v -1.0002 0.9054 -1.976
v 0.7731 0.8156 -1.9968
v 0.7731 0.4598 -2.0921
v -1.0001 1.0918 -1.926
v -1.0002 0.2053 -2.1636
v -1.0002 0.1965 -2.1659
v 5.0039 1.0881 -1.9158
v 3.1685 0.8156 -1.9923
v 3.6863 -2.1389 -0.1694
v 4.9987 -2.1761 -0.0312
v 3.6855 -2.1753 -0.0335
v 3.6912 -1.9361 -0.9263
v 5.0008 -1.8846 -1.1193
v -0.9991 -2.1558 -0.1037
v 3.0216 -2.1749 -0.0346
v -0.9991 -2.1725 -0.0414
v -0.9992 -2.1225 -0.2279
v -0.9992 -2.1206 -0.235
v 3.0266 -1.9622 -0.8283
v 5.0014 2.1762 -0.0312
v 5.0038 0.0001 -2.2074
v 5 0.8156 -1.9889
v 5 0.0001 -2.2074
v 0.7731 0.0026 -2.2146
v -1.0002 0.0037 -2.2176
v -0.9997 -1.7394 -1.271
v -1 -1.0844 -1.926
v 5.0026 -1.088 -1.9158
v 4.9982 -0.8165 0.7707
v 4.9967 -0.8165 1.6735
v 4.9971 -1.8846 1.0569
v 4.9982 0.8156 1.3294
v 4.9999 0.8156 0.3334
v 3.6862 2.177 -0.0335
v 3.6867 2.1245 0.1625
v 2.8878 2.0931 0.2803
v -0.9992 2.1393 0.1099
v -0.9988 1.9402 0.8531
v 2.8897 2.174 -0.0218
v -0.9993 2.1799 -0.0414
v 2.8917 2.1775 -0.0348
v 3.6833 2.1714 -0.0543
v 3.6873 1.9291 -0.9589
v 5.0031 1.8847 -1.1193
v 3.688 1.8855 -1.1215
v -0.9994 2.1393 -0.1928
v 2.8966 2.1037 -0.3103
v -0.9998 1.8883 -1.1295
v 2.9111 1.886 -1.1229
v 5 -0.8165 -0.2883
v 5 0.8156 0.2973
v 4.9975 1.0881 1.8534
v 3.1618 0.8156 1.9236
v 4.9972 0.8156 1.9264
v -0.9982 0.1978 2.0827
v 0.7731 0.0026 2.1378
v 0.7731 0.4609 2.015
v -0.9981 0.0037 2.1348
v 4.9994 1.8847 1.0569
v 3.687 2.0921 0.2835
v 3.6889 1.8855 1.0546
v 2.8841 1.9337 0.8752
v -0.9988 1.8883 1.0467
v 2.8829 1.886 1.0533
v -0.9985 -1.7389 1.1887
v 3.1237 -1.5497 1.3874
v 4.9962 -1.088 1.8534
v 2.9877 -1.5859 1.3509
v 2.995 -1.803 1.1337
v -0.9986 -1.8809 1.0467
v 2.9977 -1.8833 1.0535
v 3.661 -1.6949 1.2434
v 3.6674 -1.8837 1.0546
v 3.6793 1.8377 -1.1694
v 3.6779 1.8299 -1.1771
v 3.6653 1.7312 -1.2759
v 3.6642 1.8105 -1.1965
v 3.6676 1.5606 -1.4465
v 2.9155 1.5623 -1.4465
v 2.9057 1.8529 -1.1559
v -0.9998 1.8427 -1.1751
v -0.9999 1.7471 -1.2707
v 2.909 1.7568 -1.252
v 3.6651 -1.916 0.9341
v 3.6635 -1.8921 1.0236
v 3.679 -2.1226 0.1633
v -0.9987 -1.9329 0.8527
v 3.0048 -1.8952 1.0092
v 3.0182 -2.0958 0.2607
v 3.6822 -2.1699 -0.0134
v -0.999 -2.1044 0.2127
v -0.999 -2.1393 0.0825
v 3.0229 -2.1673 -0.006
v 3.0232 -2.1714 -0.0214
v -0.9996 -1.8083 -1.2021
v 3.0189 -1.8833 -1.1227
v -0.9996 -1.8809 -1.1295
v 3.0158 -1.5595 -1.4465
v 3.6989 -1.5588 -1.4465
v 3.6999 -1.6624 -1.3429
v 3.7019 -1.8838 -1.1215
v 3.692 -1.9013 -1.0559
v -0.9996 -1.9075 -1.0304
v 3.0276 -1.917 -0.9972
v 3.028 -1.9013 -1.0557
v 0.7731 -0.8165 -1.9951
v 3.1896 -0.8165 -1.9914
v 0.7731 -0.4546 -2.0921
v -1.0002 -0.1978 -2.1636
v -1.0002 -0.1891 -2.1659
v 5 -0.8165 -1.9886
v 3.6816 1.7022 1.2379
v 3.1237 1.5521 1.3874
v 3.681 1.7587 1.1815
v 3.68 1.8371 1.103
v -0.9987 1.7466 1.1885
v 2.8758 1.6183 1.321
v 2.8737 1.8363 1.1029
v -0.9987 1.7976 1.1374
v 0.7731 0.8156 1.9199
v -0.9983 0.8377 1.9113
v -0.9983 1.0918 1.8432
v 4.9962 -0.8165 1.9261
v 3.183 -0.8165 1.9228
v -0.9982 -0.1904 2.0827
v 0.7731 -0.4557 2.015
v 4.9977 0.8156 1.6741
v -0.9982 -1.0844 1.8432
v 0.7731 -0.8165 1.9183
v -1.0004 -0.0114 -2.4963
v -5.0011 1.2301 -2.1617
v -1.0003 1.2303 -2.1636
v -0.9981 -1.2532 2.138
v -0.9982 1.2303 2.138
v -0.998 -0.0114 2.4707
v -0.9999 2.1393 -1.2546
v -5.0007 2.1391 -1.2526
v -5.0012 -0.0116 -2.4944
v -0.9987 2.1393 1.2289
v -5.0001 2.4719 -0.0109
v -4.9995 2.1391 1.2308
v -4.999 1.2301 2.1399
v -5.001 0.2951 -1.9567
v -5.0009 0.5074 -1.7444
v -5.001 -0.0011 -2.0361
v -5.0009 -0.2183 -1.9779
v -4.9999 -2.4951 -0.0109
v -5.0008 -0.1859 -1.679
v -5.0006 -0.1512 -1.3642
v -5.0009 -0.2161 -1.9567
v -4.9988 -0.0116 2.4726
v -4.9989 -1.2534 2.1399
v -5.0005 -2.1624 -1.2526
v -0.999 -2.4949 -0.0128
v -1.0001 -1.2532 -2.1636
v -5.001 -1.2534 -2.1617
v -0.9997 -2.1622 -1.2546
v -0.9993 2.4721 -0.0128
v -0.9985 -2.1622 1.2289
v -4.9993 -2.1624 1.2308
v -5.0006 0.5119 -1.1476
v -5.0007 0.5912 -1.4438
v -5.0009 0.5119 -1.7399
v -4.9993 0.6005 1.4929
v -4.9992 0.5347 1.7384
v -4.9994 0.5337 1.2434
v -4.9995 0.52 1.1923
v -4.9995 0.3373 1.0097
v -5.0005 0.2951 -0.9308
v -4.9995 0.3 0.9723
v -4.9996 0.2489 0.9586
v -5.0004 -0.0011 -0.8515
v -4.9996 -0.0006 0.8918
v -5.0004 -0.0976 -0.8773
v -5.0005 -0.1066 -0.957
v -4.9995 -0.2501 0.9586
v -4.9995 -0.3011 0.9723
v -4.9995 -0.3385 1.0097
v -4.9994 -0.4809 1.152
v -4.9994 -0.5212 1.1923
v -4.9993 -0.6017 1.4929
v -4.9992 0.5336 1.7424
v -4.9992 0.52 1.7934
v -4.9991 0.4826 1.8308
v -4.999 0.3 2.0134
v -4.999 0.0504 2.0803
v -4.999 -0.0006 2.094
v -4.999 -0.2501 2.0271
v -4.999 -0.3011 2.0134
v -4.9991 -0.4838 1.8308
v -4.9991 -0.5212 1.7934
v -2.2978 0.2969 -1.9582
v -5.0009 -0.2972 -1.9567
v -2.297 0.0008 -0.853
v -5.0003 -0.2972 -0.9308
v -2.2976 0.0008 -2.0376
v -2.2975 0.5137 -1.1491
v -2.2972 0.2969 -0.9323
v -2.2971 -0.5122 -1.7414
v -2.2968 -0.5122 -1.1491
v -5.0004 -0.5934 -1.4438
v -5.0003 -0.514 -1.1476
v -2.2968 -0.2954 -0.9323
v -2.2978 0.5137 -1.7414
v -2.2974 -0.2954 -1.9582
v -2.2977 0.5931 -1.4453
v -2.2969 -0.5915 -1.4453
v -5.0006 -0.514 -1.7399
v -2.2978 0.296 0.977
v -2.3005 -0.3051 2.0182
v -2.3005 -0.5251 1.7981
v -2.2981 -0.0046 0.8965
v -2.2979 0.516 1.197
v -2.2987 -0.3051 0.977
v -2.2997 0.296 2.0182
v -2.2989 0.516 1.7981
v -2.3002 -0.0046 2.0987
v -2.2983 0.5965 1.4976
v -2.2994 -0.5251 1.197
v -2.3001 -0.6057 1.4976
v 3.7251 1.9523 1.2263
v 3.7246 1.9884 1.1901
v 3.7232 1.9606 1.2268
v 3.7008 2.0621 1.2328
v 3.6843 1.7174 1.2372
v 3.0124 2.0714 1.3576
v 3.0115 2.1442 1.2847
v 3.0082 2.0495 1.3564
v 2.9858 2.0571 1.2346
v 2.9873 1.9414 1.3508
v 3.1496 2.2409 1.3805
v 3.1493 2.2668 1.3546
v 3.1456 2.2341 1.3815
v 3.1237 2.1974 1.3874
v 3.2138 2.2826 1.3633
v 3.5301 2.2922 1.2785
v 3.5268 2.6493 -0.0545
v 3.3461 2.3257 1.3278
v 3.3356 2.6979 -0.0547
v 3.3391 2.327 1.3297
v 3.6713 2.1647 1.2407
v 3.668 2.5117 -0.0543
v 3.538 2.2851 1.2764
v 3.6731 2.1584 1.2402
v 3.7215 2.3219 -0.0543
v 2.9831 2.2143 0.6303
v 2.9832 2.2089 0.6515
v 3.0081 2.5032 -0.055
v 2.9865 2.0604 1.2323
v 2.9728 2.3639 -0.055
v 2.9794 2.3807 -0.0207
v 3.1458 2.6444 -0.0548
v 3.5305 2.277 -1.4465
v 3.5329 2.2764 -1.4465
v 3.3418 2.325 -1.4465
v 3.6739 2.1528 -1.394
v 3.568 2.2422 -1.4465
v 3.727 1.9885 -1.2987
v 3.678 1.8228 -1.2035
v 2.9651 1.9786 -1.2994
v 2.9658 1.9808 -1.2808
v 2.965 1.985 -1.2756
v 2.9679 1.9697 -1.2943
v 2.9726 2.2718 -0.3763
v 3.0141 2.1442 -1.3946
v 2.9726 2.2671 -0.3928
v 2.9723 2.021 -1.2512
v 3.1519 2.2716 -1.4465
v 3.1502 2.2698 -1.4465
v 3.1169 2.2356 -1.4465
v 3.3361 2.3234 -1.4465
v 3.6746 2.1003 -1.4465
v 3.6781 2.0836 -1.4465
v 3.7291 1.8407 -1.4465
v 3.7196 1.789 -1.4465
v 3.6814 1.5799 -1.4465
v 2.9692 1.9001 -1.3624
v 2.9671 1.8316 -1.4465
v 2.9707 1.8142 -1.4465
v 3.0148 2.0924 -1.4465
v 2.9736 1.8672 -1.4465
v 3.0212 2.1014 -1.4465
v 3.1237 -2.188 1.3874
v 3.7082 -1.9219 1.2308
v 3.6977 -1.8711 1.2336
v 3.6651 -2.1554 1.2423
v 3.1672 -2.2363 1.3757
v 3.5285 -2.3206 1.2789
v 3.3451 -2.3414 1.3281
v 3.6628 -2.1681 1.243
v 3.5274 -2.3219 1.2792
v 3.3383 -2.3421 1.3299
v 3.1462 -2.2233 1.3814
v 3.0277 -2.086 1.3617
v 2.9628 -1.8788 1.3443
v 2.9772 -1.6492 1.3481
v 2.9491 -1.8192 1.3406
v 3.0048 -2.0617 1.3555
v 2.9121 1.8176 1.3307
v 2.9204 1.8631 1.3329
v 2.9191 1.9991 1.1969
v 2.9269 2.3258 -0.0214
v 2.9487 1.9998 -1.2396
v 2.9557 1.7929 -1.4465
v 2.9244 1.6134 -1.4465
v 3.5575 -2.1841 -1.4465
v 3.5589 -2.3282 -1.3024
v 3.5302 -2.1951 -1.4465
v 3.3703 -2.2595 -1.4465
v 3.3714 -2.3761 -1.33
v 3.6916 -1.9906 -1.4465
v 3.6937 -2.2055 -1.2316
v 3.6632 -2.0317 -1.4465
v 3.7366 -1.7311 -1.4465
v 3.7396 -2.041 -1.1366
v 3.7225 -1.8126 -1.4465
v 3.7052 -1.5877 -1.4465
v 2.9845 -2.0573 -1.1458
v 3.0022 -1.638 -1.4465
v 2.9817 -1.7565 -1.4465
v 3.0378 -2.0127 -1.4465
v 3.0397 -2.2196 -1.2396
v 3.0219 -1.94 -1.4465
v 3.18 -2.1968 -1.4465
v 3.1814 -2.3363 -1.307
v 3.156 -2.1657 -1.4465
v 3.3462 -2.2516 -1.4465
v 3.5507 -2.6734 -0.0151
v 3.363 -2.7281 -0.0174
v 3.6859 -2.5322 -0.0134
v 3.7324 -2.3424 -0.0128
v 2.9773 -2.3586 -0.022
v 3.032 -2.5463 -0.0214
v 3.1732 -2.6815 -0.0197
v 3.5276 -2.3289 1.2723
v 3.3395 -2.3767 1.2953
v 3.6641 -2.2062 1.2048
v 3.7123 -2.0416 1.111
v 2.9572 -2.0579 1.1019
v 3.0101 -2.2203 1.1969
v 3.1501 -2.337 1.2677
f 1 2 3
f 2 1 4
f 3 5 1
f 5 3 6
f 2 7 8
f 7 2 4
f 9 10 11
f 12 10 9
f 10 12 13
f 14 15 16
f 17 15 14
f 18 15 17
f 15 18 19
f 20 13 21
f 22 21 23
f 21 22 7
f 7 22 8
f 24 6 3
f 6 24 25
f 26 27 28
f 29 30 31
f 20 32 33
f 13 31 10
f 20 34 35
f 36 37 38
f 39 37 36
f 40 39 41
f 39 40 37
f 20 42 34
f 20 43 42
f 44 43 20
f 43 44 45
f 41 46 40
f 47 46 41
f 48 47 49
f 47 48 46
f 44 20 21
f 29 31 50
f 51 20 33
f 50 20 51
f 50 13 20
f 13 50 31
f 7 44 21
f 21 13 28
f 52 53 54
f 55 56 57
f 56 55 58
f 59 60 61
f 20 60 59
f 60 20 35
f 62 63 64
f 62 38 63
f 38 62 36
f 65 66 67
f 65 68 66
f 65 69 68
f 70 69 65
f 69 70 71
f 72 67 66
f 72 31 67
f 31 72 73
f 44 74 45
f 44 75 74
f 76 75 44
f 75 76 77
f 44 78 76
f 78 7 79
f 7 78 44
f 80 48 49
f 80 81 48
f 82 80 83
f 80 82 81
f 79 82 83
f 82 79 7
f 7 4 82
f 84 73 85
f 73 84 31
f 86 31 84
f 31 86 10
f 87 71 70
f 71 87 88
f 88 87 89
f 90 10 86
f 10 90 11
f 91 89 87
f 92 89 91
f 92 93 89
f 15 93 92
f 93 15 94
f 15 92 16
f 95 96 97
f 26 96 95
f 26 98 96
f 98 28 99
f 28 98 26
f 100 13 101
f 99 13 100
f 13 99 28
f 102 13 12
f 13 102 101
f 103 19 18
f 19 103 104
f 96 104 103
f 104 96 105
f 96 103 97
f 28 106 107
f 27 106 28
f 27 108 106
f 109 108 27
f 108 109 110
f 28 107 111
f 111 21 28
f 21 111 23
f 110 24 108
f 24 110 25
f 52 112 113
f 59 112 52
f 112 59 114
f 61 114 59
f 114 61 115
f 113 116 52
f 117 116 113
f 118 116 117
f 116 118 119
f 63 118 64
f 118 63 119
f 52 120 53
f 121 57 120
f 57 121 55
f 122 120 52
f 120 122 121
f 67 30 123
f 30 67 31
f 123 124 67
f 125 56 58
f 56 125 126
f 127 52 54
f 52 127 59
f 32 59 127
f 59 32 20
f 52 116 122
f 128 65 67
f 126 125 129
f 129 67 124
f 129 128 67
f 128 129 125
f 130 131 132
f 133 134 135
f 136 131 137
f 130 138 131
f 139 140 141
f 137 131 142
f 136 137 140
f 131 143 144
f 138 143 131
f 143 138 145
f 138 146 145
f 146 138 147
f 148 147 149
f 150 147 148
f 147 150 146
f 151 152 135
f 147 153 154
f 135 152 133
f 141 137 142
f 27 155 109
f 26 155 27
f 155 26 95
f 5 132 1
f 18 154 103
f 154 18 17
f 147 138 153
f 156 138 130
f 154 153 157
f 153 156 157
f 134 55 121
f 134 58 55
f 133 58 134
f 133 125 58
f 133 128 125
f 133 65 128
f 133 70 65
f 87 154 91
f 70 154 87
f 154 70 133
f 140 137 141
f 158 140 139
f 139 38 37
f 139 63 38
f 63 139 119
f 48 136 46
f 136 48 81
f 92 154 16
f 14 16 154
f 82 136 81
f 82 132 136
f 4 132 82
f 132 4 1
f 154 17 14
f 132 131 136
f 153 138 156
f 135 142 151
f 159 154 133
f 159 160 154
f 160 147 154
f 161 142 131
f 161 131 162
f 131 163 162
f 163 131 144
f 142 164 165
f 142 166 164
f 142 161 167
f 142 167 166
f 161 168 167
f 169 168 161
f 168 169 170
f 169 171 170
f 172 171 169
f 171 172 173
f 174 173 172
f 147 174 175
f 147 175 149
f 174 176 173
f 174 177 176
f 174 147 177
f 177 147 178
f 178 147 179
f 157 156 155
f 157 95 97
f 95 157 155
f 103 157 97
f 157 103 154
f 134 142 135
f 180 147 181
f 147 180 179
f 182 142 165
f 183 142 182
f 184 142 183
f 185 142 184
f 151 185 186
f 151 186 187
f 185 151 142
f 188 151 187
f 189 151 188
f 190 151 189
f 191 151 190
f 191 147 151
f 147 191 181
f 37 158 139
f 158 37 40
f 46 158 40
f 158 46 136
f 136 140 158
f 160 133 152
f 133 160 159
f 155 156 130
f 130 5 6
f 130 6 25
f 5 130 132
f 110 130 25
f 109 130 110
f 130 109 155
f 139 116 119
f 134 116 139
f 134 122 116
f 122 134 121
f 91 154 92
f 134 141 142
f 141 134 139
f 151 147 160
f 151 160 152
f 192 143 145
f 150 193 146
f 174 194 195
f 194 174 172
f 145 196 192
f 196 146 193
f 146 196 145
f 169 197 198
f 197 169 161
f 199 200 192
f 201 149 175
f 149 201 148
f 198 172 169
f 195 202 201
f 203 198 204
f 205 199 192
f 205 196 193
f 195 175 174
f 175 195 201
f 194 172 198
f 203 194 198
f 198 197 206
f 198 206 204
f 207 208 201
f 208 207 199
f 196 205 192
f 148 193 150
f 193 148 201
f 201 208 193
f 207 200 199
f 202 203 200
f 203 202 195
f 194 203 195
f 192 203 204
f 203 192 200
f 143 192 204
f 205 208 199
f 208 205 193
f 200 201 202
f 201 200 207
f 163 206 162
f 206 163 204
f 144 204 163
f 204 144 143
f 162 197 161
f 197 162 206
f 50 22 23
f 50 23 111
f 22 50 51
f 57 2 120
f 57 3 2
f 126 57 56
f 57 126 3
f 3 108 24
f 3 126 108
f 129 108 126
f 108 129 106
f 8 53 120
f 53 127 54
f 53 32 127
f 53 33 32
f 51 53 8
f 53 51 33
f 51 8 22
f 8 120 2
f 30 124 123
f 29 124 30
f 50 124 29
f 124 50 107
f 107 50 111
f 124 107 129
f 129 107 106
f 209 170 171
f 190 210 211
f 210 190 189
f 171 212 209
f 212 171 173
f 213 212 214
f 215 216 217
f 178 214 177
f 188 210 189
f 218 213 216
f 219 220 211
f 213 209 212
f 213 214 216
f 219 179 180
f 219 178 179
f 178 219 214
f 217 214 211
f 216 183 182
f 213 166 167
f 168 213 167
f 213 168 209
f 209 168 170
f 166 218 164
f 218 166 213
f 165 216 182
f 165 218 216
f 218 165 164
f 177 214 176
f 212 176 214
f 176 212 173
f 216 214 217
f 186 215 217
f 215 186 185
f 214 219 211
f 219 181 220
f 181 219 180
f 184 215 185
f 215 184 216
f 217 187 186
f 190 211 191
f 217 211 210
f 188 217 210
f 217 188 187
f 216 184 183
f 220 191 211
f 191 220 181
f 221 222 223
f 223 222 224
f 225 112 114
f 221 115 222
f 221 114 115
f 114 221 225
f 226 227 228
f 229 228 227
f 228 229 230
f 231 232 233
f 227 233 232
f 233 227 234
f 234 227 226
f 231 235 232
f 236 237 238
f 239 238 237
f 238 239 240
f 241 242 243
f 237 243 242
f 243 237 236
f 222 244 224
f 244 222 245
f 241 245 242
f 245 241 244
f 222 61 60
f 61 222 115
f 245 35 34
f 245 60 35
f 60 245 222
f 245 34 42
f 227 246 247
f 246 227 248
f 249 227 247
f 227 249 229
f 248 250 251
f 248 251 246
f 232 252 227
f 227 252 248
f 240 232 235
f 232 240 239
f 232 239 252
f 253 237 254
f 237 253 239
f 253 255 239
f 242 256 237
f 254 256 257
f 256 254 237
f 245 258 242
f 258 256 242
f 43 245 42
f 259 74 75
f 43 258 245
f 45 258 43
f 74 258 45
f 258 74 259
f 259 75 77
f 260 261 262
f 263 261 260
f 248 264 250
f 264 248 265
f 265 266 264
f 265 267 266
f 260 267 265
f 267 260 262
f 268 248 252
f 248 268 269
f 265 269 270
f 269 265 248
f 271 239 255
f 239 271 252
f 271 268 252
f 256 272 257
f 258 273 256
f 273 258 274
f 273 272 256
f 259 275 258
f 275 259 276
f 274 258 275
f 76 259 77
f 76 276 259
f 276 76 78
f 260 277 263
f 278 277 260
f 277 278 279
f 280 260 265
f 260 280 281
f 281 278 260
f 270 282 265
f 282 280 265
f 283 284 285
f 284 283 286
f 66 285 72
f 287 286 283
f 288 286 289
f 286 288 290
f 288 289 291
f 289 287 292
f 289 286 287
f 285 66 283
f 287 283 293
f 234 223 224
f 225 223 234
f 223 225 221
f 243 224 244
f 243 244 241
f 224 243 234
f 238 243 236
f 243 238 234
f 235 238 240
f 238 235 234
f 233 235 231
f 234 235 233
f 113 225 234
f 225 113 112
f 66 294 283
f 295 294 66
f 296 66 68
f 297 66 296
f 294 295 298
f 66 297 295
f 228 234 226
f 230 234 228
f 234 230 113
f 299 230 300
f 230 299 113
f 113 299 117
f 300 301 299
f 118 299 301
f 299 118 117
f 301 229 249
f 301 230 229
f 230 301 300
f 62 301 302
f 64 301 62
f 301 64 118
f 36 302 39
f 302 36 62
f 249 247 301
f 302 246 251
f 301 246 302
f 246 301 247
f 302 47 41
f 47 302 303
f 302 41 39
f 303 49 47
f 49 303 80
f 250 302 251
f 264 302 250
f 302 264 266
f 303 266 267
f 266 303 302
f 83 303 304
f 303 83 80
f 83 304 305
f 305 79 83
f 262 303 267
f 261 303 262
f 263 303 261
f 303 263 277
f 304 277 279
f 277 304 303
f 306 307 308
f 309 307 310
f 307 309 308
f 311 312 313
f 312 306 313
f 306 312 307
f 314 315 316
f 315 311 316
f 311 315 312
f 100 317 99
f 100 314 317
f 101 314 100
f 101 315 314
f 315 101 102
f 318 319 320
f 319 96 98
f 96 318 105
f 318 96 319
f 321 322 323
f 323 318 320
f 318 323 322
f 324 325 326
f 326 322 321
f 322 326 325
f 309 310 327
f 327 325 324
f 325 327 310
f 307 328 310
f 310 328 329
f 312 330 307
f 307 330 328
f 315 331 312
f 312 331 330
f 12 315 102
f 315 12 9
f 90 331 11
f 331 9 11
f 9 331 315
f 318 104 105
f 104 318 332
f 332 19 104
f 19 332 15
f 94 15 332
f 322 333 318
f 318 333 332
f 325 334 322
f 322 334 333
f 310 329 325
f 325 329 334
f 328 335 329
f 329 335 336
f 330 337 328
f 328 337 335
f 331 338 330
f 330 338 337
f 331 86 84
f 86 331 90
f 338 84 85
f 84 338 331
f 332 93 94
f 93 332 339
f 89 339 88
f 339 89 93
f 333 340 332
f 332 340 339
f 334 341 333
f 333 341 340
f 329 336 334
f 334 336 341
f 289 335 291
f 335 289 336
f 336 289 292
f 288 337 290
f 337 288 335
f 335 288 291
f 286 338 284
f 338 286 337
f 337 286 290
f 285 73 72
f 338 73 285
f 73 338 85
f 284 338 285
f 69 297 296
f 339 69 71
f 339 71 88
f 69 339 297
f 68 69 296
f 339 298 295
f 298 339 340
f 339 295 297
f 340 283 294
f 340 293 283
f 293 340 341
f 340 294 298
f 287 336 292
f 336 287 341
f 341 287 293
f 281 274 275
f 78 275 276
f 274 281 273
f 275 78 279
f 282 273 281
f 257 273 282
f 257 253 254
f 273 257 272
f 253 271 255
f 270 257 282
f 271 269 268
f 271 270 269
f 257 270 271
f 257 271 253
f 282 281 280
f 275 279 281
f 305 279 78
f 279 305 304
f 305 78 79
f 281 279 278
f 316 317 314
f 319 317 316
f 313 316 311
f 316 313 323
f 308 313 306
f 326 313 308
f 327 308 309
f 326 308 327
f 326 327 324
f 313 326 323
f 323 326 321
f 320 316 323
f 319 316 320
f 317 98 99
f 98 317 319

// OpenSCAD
intersection() {
translate([-6.000000, -3.264516, -2.977332])
cube(size = [12.000000, 6.529032, 5.954664], center = false);
union() {
// Begin.
union() {
difference() {
union() {
rotate([0, -0.0974028, -0.0349504])
translate([1.35175, 0.00311, -0.03972])
rotate([0, 90, 0])
cylinder(h = 7.2965, r1 = 2.17617, r2 = 2.17617, center = true, $fn = 12);

rotate([0, 0.027502, 0.00286479])
translate([-2.99958, -0.01139, -0.0133])
rotate([0, 90, 0])
cylinder(h = 4.00084, r1 = 2.4835, r2 = 2.4835, center = true, $fn = 12);
}

union() {
union() {
rotate([0, 0.0315127, 0.0395341])
translate([-3.64825, 0.002361, -1.44653])
rotate([0, 90, 0])
cylinder(h = 2.7035, r1 = 0.5923, r2 = 0.5923, center = true, $fn = 12);

rotate([0, -0, 0])
translate([2.88655, -0.000479996, 0])
cube(size = [4.2269, 1.63208, 36.4], center = true);
}

rotate([0, -0.100268, -0.0842248])
translate([-10.2483, -0.007944, 1.50162])
rotate([0, 90, 0])
cylinder(h = 15.9035, r1 = 0.6011, r2 = 0.6011, center = true, $fn = 12);
}
}

intersection() {
rotate([0, -0, 0])
translate([9.48655, 0, 8.37674])
cube(size = [17.4269, 36.4, 19.6465], center = true);

intersection() {
union() {
translate([3.3064, -0.10321, -0.01738])
rotate([0, -0.696144, 1.23547])
rotate([0, 90, 0])
rotate_extrude($fn = 12)
translate([2.24781, 0, 0])
circle(r = 0.37765, $fn = 12);

difference() {
translate([3.37272, -0.17168, -0.05466])
rotate([0, -0.054431, 0.740834])
rotate([0, 90, 0])
rotate_extrude($fn = 12)
translate([2.48883, 0, 0])
circle(r = 0.381, $fn = 12);

rotate([0, -0, 90])
translate([-9.50826, -3.12375, -0.48886])
rotate([0, 90, 0])
cylinder(h = 17.3835, r1 = 1.87625, r2 = 1.87625, center = true, $fn = 12);
}
}

rotate([0, -0, 90])
translate([0, -3.12375, -0.48886])
rotate([0, 90, 0])
cylinder(h = 36.4, r1 = 1.87625, r2 = 1.87625, center = true, $fn = 12);
}
}
}
// End.
}
}
